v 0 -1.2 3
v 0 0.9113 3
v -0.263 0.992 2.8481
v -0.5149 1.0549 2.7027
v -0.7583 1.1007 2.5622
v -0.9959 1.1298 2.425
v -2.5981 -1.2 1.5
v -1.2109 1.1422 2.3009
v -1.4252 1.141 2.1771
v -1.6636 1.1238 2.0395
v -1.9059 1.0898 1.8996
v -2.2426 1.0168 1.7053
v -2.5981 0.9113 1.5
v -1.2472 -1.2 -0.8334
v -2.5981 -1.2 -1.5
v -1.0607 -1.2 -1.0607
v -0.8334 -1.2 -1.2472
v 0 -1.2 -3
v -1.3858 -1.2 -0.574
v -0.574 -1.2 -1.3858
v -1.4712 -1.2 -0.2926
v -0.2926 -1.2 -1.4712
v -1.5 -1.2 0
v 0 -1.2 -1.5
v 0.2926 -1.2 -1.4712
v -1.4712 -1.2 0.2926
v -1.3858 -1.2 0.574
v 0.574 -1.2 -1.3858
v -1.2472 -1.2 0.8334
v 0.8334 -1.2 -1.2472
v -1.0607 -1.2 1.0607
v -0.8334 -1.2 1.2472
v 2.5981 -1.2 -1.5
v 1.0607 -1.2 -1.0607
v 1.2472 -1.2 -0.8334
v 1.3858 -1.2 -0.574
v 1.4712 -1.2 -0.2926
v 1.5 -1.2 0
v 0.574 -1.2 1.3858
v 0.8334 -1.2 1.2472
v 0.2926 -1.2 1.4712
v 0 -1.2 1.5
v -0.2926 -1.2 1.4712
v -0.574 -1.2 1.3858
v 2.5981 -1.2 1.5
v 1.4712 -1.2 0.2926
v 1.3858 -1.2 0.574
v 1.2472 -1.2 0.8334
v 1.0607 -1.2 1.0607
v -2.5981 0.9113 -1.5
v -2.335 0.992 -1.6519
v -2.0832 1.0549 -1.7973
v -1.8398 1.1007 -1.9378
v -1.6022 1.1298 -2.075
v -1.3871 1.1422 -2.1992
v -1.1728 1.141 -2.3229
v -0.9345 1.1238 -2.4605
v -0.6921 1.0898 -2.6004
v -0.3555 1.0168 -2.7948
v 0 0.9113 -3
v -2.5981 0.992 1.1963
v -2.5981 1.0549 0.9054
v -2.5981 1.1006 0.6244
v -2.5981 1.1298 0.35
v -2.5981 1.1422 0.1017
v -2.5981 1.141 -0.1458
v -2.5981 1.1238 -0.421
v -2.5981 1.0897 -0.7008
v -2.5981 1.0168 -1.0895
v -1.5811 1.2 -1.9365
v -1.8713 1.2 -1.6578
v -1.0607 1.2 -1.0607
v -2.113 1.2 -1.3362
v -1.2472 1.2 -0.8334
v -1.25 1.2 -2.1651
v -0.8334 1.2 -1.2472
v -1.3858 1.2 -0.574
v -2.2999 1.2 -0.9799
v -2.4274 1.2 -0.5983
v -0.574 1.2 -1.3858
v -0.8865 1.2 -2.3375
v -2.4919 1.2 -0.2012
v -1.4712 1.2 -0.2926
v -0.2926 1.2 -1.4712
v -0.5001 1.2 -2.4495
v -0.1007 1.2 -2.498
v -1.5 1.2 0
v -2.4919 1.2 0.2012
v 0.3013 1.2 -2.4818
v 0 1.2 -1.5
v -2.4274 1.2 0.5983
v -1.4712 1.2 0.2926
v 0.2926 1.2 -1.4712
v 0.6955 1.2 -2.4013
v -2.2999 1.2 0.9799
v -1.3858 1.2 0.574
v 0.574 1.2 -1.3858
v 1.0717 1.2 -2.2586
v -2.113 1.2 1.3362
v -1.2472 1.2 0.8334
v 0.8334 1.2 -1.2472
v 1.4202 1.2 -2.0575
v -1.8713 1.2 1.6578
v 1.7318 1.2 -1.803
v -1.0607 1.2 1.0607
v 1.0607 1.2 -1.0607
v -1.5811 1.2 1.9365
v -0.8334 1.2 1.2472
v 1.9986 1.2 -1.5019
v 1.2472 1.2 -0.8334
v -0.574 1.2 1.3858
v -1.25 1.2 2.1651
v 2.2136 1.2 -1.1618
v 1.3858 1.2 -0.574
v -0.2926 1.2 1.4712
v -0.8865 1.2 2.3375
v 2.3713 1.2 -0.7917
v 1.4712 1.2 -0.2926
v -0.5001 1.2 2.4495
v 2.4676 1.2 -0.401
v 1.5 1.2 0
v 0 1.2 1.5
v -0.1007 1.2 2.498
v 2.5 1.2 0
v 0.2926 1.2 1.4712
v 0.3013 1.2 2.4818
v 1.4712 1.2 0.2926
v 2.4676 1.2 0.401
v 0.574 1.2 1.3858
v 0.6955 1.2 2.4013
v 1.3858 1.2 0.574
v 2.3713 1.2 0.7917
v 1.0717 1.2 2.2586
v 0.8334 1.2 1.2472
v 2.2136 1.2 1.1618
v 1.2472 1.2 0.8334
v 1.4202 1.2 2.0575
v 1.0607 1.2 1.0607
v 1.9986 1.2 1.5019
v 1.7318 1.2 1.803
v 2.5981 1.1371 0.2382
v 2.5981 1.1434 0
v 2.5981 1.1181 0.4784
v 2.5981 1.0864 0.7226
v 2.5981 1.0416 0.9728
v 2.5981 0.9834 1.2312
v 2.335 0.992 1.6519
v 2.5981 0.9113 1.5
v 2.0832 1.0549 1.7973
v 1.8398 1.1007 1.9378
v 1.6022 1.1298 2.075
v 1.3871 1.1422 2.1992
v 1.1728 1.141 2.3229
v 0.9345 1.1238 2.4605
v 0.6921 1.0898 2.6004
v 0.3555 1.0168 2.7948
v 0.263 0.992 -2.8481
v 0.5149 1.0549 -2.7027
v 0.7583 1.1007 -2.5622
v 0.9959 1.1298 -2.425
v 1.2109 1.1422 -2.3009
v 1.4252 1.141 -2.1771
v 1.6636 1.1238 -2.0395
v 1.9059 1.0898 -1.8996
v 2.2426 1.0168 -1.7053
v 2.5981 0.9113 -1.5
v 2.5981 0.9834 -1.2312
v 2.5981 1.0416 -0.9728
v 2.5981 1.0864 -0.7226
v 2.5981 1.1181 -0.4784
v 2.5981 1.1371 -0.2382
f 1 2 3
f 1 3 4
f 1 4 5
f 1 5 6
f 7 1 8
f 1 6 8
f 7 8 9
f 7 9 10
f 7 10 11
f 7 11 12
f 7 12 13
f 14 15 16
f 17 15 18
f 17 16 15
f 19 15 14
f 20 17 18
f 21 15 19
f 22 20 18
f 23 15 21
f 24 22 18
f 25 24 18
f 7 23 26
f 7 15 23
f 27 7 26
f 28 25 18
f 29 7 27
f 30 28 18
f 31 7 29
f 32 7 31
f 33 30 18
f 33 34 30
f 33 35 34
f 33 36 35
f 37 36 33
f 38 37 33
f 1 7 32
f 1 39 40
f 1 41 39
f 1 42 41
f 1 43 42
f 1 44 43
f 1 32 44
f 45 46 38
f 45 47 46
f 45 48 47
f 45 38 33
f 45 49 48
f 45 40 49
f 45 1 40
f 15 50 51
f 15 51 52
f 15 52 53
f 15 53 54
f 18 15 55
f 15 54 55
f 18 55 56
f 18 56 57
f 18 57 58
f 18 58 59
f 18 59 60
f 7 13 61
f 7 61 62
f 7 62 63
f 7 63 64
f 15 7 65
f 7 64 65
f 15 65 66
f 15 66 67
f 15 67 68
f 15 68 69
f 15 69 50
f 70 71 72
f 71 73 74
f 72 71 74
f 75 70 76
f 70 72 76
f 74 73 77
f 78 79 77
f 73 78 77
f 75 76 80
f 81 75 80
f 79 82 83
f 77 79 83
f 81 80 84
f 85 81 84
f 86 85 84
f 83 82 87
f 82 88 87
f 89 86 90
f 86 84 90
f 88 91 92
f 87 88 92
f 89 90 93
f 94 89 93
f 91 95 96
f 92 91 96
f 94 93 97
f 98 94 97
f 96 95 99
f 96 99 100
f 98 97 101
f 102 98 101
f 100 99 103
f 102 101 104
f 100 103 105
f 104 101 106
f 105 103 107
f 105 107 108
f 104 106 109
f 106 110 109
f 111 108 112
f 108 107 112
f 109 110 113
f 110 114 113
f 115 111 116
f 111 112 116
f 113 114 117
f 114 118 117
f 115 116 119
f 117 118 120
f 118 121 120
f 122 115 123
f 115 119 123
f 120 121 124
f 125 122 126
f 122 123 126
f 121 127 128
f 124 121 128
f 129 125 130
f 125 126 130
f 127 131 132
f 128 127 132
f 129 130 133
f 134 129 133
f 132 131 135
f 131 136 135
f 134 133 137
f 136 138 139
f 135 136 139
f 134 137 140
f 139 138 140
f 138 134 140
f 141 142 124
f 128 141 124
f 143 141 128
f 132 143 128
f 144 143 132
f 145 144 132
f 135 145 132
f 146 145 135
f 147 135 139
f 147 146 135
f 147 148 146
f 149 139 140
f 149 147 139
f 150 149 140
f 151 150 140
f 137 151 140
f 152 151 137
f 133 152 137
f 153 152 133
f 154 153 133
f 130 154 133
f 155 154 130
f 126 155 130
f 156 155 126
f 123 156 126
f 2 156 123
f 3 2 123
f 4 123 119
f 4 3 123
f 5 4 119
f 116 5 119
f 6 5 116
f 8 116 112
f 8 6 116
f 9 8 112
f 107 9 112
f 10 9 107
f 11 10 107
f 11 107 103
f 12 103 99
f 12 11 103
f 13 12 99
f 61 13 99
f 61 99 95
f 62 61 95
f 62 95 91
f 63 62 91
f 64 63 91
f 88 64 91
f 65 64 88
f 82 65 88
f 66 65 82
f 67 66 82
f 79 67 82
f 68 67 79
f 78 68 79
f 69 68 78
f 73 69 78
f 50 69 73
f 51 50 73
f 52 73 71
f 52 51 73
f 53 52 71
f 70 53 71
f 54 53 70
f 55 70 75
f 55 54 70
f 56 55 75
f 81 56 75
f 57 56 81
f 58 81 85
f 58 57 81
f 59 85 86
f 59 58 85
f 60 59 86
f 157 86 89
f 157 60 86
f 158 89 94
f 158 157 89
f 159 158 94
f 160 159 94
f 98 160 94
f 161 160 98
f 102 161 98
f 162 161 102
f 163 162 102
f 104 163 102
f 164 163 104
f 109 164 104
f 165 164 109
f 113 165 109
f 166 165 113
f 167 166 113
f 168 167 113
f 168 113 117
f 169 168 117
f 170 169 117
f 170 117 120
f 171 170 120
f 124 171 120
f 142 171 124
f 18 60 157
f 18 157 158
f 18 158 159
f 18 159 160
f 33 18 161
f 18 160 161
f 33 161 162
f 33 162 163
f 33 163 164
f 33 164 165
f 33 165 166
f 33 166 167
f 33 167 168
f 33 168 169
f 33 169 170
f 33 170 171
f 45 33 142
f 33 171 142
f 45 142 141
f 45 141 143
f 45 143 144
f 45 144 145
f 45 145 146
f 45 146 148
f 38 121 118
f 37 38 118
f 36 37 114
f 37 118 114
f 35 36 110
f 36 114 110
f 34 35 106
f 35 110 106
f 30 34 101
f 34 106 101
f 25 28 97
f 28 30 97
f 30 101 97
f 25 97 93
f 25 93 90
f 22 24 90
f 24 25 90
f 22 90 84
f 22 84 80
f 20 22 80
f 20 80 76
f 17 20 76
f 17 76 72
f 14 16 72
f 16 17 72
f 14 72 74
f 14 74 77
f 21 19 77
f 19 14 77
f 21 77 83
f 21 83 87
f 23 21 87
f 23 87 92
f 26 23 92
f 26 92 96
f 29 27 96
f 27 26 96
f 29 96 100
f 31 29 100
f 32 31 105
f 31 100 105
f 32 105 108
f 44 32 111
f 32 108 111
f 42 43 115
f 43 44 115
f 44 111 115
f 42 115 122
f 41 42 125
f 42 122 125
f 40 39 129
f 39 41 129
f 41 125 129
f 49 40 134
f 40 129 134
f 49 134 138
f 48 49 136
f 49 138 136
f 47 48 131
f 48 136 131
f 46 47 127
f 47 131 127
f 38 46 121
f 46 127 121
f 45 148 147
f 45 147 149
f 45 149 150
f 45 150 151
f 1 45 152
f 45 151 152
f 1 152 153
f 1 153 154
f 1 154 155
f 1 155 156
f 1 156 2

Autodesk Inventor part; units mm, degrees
ref_plane "YZ Plane" through (0, 0, 0) normal (1, 0, 0) x (0, 1, 0)
ref_plane "XZ Plane" through (0, 0, 0) normal (0, 1, 0) x (-1, 0, 0)
ref_plane "XY Plane" through (0, 0, 0) normal (0, 0, 1) x (1, 0, 0)
sketch "スケッチ1" plane through (0, 0, 0) normal (0, 0, 1) x (1, 0, 0)
  line L0 (1.5, 1.2) -> (2.5, 1.2)
  line L1 (3, 0.9113) -> (3, -1.2)
  line L2 (3, -1.2) -> (1.5, -1.2)
  line L3 (1.5, -1.2) -> (1.5, 1.2)
  line L4 (0, 1.2) -> (0, -1.2)
  line L5 (2.5, 1.2) -> (3, 0.9113)
  point P0 (0, 0)
  dimension "d0" = 1.2
  dimension "d1" = 2.4
  dimension "d2" = 1.5
  dimension "d3" = 3
  dimension "d4" = 1
  dimension "d5" = 30
revolve "回転1" add sketch "スケッチ1" angle 360 about axis through (0, 1.2, 0) along (0, -1, 0)
sketch "スケッチ2" plane through (0, 1.2, 0) normal (0, 1, 0) x (1, 0, 0)
  circle A0 centre (0, 0) radius 1.5 projected
  line L0 (0, 3) -> (2.5981, 1.5)
  line L1 (2.5981, 1.5) -> (2.5981, -1.5)
  line L2 (2.5981, -1.5) -> (0, -3)
  line L3 (0, -3) -> (-2.5981, -1.5)
  line L4 (-2.5981, -1.5) -> (-2.5981, 1.5)
  line L5 (-2.5981, 1.5) -> (0, 3)
  dimension "d7" = 3
extrude "押し出し1" cut sketch "スケッチ2" against normal blind 2.4 keep common part
thread "ねじ1" size "M3x0.5" class "6H" standard "ANSI Metric M Profile" full length
properties material "ステンレス鋼"
